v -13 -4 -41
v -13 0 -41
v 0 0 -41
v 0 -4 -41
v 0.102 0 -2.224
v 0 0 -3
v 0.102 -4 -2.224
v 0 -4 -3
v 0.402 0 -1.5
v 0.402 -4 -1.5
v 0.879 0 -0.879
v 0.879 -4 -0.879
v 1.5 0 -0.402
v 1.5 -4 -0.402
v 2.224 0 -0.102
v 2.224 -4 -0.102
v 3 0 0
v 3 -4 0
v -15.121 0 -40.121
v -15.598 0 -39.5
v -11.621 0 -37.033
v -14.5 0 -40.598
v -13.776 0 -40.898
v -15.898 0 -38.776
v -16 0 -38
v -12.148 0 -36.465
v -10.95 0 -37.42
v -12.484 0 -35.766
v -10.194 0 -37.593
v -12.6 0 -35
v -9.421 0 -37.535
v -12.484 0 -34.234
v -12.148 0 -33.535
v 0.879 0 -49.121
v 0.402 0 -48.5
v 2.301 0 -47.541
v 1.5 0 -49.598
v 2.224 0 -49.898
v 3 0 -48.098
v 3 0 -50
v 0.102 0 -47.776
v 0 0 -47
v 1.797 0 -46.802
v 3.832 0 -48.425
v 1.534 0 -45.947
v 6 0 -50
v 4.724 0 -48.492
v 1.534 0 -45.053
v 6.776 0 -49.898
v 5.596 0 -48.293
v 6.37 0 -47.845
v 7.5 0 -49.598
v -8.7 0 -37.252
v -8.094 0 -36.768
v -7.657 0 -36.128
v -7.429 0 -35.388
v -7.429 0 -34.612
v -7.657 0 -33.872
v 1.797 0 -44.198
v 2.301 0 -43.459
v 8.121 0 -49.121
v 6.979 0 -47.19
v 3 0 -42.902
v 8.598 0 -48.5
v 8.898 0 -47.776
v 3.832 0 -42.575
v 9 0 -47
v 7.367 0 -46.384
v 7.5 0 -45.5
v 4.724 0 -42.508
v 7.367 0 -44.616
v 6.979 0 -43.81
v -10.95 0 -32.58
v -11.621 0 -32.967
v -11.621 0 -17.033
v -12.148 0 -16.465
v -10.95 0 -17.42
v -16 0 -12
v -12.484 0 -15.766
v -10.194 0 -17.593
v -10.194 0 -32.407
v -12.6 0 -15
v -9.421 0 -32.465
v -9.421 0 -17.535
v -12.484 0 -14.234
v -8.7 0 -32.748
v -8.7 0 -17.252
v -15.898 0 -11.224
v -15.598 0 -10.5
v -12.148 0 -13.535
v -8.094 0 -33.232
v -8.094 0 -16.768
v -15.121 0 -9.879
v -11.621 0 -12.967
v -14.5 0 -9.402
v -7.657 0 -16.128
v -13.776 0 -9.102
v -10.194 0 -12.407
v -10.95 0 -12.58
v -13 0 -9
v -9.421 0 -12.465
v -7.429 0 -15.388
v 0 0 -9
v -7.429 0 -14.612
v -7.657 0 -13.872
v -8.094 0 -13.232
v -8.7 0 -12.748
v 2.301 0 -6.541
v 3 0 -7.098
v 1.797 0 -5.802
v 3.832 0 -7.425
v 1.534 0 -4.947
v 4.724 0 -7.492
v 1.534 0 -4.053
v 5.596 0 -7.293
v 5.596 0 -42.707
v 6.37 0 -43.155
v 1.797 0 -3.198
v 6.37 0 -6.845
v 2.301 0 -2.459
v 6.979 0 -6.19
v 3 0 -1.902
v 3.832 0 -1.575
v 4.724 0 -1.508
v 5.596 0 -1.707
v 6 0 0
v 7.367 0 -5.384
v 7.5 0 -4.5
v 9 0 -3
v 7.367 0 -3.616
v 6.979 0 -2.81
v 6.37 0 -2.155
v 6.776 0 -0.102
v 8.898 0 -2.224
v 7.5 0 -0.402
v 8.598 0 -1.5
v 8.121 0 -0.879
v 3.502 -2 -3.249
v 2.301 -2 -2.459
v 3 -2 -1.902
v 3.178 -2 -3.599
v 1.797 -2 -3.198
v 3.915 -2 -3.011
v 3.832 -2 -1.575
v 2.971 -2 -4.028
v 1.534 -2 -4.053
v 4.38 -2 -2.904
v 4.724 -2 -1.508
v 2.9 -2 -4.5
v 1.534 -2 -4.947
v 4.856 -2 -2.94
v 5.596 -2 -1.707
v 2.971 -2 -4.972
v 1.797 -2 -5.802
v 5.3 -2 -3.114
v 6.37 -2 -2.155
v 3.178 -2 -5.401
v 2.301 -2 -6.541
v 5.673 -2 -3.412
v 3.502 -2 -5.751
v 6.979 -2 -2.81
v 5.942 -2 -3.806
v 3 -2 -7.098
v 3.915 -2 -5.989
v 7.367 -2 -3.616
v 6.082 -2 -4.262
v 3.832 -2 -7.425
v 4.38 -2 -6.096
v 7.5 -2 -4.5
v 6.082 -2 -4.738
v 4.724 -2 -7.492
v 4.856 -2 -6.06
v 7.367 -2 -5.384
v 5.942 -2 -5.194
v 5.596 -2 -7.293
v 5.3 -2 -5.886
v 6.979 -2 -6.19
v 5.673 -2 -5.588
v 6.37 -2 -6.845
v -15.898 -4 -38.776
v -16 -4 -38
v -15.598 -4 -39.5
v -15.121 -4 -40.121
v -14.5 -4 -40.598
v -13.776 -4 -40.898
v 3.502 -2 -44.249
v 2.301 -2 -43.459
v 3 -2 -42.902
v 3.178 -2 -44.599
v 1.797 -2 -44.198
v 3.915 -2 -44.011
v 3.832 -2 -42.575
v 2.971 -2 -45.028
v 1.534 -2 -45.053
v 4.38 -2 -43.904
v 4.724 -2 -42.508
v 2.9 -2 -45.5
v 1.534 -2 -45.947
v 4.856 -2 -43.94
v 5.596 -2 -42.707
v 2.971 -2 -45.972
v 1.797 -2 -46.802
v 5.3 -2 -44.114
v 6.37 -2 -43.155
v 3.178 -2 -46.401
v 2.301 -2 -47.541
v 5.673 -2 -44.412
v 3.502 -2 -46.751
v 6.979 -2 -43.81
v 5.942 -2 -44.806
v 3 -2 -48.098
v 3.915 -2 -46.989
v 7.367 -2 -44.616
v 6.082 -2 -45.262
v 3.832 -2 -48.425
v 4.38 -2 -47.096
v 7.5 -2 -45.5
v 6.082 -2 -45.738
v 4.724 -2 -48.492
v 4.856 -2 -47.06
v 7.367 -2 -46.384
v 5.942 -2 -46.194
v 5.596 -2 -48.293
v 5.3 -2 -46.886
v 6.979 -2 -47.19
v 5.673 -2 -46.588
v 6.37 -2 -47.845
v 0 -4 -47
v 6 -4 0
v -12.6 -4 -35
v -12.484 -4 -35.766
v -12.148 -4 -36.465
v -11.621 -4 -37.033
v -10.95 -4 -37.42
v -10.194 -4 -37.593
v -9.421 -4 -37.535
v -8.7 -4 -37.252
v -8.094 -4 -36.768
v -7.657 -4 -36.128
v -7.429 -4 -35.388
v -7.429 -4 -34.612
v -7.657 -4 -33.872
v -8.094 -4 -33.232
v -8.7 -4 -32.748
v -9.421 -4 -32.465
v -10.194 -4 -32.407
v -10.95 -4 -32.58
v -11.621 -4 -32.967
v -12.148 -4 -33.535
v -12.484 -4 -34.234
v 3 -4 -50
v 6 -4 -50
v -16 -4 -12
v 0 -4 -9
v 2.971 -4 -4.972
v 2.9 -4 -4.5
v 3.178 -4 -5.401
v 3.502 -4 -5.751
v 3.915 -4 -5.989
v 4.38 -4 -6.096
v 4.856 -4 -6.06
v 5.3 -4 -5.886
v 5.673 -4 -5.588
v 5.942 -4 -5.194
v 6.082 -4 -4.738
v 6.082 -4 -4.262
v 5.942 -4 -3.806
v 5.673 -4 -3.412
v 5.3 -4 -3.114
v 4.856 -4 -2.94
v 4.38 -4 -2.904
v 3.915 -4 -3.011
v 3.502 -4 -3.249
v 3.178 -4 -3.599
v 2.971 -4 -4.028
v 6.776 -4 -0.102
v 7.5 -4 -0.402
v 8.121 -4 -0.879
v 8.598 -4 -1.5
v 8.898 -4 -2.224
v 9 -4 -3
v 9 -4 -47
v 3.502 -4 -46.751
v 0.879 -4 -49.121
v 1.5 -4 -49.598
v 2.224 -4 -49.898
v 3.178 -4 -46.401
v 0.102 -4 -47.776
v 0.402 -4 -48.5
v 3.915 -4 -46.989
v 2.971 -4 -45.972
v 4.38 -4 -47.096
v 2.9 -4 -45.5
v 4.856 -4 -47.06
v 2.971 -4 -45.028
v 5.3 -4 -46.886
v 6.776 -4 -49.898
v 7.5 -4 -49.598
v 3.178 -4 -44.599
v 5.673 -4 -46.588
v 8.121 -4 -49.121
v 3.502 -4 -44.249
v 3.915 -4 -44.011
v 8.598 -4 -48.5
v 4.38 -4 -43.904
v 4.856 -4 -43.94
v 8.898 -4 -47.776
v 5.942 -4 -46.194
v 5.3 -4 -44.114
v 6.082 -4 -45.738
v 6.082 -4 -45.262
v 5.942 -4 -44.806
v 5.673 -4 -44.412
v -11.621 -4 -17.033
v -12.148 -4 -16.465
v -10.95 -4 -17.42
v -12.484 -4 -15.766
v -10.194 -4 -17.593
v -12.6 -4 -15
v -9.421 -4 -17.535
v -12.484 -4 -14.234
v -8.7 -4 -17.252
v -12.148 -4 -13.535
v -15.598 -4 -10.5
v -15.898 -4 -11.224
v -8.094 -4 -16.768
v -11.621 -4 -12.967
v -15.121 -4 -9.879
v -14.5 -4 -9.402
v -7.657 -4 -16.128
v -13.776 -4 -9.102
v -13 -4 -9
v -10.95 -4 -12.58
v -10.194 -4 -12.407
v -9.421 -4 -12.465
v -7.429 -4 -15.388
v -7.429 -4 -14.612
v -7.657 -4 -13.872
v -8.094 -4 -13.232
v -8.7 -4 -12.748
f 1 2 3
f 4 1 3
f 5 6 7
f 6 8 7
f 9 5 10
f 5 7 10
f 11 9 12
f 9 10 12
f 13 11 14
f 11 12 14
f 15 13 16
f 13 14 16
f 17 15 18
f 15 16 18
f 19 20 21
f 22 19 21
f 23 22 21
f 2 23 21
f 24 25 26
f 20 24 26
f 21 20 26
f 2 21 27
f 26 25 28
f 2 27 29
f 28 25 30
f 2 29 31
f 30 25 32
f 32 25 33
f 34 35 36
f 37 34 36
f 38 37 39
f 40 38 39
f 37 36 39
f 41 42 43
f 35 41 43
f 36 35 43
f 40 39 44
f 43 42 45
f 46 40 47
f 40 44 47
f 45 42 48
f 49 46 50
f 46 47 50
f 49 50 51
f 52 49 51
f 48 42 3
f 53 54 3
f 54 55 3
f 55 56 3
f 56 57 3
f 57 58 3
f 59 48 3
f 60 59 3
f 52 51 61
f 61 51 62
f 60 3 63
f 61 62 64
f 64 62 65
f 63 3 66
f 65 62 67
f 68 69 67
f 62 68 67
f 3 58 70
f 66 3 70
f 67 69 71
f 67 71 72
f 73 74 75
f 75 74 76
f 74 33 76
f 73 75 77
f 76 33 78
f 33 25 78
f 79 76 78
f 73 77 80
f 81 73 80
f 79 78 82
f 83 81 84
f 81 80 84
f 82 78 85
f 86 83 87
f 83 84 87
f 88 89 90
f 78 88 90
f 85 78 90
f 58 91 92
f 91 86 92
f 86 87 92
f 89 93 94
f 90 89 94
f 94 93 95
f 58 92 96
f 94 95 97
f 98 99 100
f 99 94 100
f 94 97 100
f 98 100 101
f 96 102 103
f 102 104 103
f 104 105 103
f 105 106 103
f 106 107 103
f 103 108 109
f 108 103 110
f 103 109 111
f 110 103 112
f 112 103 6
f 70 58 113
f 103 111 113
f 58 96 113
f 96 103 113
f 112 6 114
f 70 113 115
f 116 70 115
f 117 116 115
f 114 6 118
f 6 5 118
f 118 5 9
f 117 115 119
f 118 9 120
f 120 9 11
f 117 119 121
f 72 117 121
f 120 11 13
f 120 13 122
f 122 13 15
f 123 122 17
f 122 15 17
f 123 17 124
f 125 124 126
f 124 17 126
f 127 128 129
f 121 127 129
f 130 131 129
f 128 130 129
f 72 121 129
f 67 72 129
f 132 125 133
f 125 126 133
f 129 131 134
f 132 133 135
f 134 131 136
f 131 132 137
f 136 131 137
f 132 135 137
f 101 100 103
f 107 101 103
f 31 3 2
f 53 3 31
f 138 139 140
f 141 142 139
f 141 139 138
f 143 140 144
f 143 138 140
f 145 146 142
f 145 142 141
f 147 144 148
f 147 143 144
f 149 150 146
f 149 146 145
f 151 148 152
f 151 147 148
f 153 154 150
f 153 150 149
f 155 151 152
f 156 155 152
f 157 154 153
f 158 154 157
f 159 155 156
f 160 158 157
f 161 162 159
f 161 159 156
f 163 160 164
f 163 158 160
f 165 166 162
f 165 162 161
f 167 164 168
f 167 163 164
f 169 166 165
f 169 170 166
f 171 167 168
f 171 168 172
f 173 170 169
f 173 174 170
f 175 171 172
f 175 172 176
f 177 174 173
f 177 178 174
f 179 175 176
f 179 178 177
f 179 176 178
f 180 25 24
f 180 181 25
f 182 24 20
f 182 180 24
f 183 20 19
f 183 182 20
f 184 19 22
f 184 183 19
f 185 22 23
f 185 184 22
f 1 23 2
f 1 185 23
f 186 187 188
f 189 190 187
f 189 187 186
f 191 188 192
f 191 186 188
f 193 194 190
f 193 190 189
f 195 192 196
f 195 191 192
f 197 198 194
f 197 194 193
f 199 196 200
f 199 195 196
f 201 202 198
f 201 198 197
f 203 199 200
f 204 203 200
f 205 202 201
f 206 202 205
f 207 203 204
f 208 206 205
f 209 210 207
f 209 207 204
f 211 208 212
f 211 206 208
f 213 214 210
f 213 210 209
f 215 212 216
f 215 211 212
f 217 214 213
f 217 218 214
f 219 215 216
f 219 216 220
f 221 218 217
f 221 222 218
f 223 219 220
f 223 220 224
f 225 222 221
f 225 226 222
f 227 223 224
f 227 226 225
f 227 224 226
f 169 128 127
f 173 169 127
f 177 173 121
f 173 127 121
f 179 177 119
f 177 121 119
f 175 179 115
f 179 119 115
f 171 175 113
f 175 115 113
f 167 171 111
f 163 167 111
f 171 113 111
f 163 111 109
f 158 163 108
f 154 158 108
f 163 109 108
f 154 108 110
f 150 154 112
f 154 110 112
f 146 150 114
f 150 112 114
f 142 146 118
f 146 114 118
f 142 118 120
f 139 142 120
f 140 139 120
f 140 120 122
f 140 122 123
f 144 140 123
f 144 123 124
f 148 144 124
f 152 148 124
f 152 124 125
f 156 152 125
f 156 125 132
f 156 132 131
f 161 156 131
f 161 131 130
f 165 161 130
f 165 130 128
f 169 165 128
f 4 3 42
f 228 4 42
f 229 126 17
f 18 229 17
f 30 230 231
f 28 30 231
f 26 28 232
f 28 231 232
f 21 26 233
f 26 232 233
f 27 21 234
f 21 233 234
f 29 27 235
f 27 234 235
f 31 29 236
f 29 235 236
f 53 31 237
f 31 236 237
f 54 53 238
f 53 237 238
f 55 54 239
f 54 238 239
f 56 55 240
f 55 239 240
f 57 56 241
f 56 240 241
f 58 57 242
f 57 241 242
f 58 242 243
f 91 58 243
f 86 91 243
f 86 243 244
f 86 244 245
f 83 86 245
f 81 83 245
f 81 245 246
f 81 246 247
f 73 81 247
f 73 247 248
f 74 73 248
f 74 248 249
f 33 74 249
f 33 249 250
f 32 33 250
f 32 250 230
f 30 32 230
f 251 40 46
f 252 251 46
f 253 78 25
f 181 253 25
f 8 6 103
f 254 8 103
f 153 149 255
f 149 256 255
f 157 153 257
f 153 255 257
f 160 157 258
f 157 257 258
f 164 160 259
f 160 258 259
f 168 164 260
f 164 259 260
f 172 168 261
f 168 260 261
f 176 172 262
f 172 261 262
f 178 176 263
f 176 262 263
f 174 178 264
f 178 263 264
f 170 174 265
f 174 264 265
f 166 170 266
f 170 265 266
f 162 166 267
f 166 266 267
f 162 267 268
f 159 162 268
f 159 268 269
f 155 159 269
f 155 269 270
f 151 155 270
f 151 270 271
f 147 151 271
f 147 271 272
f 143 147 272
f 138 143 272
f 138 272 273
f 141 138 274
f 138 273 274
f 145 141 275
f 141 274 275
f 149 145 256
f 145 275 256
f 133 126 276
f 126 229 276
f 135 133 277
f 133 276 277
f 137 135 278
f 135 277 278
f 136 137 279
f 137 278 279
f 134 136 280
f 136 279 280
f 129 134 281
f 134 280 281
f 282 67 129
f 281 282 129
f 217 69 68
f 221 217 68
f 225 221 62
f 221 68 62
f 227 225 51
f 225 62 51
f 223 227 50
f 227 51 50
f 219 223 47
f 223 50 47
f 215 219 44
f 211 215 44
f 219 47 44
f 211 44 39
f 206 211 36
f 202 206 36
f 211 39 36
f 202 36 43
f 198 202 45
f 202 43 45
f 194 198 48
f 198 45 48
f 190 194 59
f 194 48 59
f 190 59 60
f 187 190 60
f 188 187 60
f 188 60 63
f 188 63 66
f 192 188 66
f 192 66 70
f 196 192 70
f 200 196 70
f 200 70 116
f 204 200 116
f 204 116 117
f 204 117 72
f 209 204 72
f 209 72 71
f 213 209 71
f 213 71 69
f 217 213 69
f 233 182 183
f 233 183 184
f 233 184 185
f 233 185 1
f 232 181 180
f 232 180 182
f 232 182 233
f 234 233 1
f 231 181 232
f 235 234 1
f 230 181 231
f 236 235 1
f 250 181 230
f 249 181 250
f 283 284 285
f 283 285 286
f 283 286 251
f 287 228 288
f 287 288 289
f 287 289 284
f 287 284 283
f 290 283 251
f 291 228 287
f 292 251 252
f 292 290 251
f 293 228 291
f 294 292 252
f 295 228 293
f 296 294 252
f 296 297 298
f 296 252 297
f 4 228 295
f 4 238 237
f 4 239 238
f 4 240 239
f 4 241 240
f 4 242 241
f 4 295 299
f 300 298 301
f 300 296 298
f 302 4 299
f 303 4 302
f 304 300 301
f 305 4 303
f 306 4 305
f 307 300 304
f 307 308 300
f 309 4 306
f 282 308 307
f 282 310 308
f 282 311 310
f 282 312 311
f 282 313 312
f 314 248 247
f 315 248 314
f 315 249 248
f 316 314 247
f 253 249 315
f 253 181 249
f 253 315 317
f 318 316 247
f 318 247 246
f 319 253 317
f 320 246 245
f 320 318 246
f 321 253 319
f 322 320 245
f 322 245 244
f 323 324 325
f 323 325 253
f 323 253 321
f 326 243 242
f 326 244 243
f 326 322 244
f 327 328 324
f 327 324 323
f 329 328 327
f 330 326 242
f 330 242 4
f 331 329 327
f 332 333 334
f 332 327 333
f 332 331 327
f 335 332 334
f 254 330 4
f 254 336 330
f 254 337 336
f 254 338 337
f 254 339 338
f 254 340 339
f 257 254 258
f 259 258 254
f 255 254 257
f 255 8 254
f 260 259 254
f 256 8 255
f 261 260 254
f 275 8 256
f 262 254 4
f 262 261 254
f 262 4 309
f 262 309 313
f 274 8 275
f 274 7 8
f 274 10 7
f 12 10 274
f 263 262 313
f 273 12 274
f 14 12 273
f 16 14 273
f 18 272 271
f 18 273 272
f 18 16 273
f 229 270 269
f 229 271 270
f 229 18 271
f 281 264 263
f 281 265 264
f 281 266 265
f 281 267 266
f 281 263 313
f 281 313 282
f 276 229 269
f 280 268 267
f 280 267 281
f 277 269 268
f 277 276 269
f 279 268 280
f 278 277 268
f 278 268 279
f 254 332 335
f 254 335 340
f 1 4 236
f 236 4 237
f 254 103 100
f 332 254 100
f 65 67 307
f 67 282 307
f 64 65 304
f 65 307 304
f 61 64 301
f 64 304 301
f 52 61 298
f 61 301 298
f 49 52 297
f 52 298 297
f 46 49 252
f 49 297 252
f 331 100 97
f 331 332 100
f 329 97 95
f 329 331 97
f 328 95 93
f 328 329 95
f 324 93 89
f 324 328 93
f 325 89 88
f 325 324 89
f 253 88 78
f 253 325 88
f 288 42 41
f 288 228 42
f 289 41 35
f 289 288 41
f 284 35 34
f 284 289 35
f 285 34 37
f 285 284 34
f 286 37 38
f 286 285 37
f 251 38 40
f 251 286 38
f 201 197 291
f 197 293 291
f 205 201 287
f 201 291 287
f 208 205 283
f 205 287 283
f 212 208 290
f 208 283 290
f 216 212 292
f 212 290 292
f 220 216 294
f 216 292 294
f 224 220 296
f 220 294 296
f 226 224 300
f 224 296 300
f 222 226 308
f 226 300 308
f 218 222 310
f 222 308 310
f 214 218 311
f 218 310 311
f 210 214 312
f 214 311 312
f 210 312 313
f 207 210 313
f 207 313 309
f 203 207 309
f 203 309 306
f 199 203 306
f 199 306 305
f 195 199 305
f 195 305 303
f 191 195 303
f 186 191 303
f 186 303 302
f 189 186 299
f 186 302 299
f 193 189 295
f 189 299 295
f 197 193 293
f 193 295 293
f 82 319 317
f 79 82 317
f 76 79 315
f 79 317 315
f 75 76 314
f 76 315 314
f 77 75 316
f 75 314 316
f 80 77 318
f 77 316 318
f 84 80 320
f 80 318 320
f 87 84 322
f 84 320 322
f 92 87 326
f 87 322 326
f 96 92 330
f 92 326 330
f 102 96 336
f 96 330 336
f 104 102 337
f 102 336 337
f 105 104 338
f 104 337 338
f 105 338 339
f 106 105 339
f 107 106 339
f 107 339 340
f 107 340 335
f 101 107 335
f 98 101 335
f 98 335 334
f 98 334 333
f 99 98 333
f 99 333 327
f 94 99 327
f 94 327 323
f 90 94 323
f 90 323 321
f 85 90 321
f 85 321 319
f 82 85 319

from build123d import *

# Parameters (mm, degrees)
F1_DEPTH       = 4
F2_D           = 3.2
F2_CBORE_D     = 6
F2_CBORE_DEPTH = 2
F3_D           = 5.2
F4_R           = 3


with BuildPart() as f1:
    # F0 (on Front) → F1 (new body)
    with BuildSketch(Plane.XZ):
        Polygon((0, -9), (-16, -9), (-16, -41), (0, -41), (0, -44), (0, -50), (9, -50), (9, 0), (0, 0), (0, -6), align=None)
    extrude(amount=F1_DEPTH)

    # F2 (through all)
    with Locations(Plane(origin=(0, 0, 0), x_dir=(1, 0, 0), z_dir=(0, 1, 0))):
        with Locations((4.5, 4.5), (4.5, 45.5)):
            CounterBoreHole(F2_D / 2, F2_CBORE_D / 2, F2_CBORE_DEPTH)

    # F3 (through all)
    with Locations(Plane(origin=(0, 0, 0), x_dir=(1, 0, 0), z_dir=(0, 1, 0))):
        with Locations((-10, 15), (-10, 35)):
            Hole(F3_D / 2)

    # F4
    f4_edges = [f1.edges().sort_by_distance(p)[0] for p in [
        (-16, -2, -9),
        (-16, -2, -41),
        (9, -2, 0),
        (0, -2, 0),
        (0, -2, -50),
        (9, -2, -50),
    ]]
    fillet(f4_edges, radius=F4_R)


solid = f1.part
